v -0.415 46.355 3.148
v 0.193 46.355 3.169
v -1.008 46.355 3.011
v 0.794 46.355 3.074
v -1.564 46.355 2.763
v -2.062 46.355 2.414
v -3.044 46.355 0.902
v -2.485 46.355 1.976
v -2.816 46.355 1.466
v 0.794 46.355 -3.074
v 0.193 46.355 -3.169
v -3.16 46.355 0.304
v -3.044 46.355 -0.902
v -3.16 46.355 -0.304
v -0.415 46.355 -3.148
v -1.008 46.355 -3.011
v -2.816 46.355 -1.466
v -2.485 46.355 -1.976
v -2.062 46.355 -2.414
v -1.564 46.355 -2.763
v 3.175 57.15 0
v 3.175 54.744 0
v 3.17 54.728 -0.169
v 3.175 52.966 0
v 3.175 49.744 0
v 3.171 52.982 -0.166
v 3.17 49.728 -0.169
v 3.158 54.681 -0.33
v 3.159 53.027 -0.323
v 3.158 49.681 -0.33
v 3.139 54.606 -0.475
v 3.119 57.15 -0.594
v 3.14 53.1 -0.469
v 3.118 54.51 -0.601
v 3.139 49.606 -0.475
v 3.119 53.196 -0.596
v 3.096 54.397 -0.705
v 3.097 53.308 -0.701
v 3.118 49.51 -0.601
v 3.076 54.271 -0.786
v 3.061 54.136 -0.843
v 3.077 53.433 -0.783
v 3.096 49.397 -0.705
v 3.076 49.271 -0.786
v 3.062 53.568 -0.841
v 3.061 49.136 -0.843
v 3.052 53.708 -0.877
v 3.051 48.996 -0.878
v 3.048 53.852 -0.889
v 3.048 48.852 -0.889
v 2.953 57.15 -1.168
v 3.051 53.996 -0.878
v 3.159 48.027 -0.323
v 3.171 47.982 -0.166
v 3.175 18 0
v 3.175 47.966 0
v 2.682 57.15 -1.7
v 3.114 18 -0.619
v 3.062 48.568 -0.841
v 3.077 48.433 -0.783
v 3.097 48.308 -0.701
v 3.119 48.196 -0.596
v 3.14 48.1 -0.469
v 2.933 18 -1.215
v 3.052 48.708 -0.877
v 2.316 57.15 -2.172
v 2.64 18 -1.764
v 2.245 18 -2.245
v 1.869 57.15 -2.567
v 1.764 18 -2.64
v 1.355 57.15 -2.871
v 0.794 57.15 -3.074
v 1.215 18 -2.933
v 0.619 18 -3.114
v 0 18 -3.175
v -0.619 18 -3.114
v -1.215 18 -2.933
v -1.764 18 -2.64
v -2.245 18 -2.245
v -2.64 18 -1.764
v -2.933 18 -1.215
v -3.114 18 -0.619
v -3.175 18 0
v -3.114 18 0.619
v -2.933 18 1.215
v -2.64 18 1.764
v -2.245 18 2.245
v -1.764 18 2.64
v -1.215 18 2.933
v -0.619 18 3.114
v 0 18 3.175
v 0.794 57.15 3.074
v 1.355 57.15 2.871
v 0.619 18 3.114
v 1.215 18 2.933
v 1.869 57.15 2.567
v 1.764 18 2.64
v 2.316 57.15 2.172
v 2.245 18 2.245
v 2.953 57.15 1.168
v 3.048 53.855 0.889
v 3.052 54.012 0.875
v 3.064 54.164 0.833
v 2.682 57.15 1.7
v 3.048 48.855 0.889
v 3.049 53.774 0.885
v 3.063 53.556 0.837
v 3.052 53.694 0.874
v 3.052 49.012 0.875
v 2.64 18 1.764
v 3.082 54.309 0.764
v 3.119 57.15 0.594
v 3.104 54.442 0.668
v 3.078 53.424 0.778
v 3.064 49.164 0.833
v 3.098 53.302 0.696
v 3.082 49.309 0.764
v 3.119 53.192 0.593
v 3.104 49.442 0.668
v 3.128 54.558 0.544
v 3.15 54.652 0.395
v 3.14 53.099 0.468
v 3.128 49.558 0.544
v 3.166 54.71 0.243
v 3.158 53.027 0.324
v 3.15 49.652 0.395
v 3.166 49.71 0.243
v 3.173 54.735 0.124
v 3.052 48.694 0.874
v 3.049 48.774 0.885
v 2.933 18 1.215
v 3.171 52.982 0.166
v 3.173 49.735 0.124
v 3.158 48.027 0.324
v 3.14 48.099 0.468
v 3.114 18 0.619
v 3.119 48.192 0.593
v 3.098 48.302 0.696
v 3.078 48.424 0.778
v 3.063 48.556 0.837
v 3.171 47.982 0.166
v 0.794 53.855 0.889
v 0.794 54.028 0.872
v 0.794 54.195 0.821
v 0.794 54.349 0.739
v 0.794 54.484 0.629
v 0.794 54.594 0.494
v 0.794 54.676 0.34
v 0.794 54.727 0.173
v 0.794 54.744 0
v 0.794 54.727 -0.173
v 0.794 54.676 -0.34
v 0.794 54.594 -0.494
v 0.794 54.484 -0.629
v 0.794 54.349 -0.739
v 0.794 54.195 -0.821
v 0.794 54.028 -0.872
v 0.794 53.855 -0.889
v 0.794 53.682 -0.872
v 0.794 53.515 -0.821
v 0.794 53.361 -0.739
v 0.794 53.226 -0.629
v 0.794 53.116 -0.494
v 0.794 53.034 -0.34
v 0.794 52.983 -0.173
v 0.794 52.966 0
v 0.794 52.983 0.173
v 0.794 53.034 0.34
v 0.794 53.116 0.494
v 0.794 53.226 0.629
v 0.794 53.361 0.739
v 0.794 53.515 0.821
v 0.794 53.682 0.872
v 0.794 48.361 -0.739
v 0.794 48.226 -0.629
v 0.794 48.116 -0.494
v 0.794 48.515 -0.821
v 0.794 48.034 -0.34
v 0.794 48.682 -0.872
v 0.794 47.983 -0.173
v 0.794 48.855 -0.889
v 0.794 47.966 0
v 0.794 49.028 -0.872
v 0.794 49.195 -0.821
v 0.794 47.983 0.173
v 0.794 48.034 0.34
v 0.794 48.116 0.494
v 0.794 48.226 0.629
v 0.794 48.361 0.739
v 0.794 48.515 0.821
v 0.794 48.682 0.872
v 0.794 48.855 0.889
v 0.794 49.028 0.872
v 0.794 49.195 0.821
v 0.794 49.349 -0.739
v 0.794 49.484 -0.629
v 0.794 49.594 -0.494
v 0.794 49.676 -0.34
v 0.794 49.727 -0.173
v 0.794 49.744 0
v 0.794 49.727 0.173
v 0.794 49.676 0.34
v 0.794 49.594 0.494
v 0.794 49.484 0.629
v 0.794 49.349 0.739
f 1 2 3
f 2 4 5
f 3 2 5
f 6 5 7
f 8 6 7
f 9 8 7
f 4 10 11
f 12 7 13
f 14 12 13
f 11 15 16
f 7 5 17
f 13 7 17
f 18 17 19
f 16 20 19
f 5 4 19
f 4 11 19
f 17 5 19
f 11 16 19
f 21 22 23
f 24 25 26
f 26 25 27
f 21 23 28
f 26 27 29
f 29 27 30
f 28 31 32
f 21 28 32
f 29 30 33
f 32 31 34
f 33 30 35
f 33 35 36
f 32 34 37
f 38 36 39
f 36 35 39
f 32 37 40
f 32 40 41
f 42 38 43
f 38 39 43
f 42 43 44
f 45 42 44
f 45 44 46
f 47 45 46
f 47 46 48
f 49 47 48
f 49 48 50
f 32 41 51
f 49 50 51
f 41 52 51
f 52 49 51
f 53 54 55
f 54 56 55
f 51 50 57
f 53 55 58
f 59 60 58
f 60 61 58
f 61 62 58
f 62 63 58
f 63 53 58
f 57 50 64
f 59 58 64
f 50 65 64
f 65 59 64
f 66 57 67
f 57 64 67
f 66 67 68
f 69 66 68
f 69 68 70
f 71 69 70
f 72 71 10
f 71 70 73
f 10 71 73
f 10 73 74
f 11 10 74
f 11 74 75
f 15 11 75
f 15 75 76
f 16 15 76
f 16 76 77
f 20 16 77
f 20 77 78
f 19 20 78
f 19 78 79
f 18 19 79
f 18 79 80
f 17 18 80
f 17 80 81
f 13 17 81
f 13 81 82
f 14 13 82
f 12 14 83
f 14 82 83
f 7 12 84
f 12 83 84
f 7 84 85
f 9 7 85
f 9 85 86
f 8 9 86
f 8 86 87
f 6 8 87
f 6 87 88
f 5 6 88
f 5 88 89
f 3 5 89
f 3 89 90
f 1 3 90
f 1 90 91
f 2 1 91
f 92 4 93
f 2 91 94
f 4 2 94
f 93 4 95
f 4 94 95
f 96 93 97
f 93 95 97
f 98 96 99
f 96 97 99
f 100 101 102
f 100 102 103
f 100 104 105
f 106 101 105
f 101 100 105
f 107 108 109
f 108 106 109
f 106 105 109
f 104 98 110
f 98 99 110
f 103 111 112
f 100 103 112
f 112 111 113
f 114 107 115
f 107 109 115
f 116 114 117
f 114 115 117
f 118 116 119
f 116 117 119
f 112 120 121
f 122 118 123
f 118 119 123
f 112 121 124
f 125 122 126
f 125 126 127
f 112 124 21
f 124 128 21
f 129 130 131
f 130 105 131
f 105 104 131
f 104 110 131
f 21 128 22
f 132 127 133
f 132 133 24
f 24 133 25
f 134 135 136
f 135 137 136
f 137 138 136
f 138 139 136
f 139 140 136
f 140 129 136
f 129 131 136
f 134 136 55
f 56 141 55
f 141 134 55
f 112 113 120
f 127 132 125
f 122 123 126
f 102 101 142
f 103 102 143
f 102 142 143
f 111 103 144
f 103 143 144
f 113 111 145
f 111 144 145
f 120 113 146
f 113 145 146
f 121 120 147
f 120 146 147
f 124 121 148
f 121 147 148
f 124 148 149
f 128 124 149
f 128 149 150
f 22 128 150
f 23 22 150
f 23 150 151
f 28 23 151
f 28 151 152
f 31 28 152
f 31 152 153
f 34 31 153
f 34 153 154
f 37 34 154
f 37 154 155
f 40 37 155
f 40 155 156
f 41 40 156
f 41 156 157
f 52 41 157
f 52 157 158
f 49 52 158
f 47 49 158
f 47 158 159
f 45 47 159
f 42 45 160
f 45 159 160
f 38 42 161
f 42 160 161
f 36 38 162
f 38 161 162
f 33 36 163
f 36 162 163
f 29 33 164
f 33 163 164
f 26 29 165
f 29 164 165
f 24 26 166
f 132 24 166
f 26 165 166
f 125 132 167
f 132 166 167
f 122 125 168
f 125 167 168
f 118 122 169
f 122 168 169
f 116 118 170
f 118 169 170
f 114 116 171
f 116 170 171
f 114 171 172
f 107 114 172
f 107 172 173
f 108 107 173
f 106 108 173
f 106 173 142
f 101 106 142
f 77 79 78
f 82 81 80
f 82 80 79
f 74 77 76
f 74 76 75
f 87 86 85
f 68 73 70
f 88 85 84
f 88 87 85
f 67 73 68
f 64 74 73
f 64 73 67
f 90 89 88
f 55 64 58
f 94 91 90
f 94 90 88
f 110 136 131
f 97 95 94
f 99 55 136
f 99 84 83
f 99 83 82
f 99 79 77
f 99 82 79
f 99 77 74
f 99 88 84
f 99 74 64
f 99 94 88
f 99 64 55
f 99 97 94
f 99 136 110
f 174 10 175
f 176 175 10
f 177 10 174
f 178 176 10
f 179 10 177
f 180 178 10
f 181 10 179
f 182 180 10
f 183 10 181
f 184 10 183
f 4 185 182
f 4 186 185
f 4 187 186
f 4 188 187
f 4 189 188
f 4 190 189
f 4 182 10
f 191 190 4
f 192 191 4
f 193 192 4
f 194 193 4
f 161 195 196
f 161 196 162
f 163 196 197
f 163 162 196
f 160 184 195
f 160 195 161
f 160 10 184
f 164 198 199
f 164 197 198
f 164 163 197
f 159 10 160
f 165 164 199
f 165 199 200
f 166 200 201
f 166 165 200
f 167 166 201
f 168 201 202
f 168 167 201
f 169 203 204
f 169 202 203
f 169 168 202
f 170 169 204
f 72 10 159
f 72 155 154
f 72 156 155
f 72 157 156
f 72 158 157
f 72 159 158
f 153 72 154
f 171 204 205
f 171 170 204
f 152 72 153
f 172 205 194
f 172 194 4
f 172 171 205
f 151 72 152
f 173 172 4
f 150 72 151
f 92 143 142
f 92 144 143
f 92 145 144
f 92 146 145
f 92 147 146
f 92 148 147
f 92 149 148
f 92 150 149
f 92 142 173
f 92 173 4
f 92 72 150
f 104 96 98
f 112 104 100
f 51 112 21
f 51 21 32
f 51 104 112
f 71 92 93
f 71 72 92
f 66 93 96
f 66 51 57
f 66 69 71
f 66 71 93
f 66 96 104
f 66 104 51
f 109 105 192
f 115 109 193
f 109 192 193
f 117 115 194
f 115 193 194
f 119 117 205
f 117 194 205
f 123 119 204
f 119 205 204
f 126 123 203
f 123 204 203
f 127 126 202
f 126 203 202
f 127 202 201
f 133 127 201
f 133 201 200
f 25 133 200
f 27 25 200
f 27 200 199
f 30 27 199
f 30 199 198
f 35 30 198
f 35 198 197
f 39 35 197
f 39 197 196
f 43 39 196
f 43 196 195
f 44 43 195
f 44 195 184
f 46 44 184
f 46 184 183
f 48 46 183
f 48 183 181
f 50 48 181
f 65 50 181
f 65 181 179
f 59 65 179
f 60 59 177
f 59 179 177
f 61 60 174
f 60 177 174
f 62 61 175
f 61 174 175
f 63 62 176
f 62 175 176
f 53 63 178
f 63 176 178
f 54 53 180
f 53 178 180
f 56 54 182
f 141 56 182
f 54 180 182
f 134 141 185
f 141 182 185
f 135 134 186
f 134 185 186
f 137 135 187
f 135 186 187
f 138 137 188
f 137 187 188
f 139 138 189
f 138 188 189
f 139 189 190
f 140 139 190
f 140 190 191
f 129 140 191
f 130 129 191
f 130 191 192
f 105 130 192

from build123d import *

# Parameters (mm, degrees)
SKETCH_1_R          = 3.175
EXTRUDE_1_DEPTH     = 57.15
CUT_EXTRUDE_1_DEPTH = 10.795
SKETCH_3_R          = 0.889
CUT_EXTRUDE_2_DEPTH = 10.795
SKETCH_4_W          = 3.926157487
SKETCH_4_H          = 0.79375
CUT_EXTRUDE_3_DEPTH = 8.573
SKETCH_5_R          = 3.774888962
CUT_EXTRUDE_4_DEPTH = 18


with BuildPart() as part:
    # 草图1 → 凸台-拉伸1 (new body)
    with BuildSketch(Plane(origin=(0, 0, 0), x_dir=(1, 0, 0), z_dir=(0, 1, 0))):
        Circle(SKETCH_1_R)
    extrude(amount=EXTRUDE_1_DEPTH)

    # 草图2 → 切除-拉伸1 (cut)
    with BuildSketch(Plane(origin=(0, 57.15, 0), x_dir=(1, 0, 0), z_dir=(0, 1, 0))):
        Polygon((-0.794, 3.175), (0.794, 3.175), (0.794, -3.175), (-3.175, -3.175), (-3.175, 3.175), align=None)
    extrude(amount=-CUT_EXTRUDE_1_DEPTH, mode=Mode.SUBTRACT)

    # 草图3 → 切除-拉伸2 (cut)
    with BuildSketch(Plane.ZY.offset(-0.794)):
        with Locations((0, 53.855)):
            Circle(SKETCH_3_R)
        with Locations((0, 48.855)):
            Circle(SKETCH_3_R)
    extrude(amount=-CUT_EXTRUDE_2_DEPTH, mode=Mode.SUBTRACT)

    # 草图4 → 切除-拉伸3 (cut)
    with BuildSketch(Plane.XZ):
        with Locations((-0.018009896, -2.778125)):
            Rectangle(SKETCH_4_W, SKETCH_4_H)
    extrude(amount=-CUT_EXTRUDE_3_DEPTH, mode=Mode.SUBTRACT)

    # 草图5 → 切除-拉伸4 (cut)
    with BuildSketch(Plane.XZ):
        Circle(SKETCH_5_R)
    extrude(amount=-CUT_EXTRUDE_4_DEPTH, mode=Mode.SUBTRACT)


solid = part.part
